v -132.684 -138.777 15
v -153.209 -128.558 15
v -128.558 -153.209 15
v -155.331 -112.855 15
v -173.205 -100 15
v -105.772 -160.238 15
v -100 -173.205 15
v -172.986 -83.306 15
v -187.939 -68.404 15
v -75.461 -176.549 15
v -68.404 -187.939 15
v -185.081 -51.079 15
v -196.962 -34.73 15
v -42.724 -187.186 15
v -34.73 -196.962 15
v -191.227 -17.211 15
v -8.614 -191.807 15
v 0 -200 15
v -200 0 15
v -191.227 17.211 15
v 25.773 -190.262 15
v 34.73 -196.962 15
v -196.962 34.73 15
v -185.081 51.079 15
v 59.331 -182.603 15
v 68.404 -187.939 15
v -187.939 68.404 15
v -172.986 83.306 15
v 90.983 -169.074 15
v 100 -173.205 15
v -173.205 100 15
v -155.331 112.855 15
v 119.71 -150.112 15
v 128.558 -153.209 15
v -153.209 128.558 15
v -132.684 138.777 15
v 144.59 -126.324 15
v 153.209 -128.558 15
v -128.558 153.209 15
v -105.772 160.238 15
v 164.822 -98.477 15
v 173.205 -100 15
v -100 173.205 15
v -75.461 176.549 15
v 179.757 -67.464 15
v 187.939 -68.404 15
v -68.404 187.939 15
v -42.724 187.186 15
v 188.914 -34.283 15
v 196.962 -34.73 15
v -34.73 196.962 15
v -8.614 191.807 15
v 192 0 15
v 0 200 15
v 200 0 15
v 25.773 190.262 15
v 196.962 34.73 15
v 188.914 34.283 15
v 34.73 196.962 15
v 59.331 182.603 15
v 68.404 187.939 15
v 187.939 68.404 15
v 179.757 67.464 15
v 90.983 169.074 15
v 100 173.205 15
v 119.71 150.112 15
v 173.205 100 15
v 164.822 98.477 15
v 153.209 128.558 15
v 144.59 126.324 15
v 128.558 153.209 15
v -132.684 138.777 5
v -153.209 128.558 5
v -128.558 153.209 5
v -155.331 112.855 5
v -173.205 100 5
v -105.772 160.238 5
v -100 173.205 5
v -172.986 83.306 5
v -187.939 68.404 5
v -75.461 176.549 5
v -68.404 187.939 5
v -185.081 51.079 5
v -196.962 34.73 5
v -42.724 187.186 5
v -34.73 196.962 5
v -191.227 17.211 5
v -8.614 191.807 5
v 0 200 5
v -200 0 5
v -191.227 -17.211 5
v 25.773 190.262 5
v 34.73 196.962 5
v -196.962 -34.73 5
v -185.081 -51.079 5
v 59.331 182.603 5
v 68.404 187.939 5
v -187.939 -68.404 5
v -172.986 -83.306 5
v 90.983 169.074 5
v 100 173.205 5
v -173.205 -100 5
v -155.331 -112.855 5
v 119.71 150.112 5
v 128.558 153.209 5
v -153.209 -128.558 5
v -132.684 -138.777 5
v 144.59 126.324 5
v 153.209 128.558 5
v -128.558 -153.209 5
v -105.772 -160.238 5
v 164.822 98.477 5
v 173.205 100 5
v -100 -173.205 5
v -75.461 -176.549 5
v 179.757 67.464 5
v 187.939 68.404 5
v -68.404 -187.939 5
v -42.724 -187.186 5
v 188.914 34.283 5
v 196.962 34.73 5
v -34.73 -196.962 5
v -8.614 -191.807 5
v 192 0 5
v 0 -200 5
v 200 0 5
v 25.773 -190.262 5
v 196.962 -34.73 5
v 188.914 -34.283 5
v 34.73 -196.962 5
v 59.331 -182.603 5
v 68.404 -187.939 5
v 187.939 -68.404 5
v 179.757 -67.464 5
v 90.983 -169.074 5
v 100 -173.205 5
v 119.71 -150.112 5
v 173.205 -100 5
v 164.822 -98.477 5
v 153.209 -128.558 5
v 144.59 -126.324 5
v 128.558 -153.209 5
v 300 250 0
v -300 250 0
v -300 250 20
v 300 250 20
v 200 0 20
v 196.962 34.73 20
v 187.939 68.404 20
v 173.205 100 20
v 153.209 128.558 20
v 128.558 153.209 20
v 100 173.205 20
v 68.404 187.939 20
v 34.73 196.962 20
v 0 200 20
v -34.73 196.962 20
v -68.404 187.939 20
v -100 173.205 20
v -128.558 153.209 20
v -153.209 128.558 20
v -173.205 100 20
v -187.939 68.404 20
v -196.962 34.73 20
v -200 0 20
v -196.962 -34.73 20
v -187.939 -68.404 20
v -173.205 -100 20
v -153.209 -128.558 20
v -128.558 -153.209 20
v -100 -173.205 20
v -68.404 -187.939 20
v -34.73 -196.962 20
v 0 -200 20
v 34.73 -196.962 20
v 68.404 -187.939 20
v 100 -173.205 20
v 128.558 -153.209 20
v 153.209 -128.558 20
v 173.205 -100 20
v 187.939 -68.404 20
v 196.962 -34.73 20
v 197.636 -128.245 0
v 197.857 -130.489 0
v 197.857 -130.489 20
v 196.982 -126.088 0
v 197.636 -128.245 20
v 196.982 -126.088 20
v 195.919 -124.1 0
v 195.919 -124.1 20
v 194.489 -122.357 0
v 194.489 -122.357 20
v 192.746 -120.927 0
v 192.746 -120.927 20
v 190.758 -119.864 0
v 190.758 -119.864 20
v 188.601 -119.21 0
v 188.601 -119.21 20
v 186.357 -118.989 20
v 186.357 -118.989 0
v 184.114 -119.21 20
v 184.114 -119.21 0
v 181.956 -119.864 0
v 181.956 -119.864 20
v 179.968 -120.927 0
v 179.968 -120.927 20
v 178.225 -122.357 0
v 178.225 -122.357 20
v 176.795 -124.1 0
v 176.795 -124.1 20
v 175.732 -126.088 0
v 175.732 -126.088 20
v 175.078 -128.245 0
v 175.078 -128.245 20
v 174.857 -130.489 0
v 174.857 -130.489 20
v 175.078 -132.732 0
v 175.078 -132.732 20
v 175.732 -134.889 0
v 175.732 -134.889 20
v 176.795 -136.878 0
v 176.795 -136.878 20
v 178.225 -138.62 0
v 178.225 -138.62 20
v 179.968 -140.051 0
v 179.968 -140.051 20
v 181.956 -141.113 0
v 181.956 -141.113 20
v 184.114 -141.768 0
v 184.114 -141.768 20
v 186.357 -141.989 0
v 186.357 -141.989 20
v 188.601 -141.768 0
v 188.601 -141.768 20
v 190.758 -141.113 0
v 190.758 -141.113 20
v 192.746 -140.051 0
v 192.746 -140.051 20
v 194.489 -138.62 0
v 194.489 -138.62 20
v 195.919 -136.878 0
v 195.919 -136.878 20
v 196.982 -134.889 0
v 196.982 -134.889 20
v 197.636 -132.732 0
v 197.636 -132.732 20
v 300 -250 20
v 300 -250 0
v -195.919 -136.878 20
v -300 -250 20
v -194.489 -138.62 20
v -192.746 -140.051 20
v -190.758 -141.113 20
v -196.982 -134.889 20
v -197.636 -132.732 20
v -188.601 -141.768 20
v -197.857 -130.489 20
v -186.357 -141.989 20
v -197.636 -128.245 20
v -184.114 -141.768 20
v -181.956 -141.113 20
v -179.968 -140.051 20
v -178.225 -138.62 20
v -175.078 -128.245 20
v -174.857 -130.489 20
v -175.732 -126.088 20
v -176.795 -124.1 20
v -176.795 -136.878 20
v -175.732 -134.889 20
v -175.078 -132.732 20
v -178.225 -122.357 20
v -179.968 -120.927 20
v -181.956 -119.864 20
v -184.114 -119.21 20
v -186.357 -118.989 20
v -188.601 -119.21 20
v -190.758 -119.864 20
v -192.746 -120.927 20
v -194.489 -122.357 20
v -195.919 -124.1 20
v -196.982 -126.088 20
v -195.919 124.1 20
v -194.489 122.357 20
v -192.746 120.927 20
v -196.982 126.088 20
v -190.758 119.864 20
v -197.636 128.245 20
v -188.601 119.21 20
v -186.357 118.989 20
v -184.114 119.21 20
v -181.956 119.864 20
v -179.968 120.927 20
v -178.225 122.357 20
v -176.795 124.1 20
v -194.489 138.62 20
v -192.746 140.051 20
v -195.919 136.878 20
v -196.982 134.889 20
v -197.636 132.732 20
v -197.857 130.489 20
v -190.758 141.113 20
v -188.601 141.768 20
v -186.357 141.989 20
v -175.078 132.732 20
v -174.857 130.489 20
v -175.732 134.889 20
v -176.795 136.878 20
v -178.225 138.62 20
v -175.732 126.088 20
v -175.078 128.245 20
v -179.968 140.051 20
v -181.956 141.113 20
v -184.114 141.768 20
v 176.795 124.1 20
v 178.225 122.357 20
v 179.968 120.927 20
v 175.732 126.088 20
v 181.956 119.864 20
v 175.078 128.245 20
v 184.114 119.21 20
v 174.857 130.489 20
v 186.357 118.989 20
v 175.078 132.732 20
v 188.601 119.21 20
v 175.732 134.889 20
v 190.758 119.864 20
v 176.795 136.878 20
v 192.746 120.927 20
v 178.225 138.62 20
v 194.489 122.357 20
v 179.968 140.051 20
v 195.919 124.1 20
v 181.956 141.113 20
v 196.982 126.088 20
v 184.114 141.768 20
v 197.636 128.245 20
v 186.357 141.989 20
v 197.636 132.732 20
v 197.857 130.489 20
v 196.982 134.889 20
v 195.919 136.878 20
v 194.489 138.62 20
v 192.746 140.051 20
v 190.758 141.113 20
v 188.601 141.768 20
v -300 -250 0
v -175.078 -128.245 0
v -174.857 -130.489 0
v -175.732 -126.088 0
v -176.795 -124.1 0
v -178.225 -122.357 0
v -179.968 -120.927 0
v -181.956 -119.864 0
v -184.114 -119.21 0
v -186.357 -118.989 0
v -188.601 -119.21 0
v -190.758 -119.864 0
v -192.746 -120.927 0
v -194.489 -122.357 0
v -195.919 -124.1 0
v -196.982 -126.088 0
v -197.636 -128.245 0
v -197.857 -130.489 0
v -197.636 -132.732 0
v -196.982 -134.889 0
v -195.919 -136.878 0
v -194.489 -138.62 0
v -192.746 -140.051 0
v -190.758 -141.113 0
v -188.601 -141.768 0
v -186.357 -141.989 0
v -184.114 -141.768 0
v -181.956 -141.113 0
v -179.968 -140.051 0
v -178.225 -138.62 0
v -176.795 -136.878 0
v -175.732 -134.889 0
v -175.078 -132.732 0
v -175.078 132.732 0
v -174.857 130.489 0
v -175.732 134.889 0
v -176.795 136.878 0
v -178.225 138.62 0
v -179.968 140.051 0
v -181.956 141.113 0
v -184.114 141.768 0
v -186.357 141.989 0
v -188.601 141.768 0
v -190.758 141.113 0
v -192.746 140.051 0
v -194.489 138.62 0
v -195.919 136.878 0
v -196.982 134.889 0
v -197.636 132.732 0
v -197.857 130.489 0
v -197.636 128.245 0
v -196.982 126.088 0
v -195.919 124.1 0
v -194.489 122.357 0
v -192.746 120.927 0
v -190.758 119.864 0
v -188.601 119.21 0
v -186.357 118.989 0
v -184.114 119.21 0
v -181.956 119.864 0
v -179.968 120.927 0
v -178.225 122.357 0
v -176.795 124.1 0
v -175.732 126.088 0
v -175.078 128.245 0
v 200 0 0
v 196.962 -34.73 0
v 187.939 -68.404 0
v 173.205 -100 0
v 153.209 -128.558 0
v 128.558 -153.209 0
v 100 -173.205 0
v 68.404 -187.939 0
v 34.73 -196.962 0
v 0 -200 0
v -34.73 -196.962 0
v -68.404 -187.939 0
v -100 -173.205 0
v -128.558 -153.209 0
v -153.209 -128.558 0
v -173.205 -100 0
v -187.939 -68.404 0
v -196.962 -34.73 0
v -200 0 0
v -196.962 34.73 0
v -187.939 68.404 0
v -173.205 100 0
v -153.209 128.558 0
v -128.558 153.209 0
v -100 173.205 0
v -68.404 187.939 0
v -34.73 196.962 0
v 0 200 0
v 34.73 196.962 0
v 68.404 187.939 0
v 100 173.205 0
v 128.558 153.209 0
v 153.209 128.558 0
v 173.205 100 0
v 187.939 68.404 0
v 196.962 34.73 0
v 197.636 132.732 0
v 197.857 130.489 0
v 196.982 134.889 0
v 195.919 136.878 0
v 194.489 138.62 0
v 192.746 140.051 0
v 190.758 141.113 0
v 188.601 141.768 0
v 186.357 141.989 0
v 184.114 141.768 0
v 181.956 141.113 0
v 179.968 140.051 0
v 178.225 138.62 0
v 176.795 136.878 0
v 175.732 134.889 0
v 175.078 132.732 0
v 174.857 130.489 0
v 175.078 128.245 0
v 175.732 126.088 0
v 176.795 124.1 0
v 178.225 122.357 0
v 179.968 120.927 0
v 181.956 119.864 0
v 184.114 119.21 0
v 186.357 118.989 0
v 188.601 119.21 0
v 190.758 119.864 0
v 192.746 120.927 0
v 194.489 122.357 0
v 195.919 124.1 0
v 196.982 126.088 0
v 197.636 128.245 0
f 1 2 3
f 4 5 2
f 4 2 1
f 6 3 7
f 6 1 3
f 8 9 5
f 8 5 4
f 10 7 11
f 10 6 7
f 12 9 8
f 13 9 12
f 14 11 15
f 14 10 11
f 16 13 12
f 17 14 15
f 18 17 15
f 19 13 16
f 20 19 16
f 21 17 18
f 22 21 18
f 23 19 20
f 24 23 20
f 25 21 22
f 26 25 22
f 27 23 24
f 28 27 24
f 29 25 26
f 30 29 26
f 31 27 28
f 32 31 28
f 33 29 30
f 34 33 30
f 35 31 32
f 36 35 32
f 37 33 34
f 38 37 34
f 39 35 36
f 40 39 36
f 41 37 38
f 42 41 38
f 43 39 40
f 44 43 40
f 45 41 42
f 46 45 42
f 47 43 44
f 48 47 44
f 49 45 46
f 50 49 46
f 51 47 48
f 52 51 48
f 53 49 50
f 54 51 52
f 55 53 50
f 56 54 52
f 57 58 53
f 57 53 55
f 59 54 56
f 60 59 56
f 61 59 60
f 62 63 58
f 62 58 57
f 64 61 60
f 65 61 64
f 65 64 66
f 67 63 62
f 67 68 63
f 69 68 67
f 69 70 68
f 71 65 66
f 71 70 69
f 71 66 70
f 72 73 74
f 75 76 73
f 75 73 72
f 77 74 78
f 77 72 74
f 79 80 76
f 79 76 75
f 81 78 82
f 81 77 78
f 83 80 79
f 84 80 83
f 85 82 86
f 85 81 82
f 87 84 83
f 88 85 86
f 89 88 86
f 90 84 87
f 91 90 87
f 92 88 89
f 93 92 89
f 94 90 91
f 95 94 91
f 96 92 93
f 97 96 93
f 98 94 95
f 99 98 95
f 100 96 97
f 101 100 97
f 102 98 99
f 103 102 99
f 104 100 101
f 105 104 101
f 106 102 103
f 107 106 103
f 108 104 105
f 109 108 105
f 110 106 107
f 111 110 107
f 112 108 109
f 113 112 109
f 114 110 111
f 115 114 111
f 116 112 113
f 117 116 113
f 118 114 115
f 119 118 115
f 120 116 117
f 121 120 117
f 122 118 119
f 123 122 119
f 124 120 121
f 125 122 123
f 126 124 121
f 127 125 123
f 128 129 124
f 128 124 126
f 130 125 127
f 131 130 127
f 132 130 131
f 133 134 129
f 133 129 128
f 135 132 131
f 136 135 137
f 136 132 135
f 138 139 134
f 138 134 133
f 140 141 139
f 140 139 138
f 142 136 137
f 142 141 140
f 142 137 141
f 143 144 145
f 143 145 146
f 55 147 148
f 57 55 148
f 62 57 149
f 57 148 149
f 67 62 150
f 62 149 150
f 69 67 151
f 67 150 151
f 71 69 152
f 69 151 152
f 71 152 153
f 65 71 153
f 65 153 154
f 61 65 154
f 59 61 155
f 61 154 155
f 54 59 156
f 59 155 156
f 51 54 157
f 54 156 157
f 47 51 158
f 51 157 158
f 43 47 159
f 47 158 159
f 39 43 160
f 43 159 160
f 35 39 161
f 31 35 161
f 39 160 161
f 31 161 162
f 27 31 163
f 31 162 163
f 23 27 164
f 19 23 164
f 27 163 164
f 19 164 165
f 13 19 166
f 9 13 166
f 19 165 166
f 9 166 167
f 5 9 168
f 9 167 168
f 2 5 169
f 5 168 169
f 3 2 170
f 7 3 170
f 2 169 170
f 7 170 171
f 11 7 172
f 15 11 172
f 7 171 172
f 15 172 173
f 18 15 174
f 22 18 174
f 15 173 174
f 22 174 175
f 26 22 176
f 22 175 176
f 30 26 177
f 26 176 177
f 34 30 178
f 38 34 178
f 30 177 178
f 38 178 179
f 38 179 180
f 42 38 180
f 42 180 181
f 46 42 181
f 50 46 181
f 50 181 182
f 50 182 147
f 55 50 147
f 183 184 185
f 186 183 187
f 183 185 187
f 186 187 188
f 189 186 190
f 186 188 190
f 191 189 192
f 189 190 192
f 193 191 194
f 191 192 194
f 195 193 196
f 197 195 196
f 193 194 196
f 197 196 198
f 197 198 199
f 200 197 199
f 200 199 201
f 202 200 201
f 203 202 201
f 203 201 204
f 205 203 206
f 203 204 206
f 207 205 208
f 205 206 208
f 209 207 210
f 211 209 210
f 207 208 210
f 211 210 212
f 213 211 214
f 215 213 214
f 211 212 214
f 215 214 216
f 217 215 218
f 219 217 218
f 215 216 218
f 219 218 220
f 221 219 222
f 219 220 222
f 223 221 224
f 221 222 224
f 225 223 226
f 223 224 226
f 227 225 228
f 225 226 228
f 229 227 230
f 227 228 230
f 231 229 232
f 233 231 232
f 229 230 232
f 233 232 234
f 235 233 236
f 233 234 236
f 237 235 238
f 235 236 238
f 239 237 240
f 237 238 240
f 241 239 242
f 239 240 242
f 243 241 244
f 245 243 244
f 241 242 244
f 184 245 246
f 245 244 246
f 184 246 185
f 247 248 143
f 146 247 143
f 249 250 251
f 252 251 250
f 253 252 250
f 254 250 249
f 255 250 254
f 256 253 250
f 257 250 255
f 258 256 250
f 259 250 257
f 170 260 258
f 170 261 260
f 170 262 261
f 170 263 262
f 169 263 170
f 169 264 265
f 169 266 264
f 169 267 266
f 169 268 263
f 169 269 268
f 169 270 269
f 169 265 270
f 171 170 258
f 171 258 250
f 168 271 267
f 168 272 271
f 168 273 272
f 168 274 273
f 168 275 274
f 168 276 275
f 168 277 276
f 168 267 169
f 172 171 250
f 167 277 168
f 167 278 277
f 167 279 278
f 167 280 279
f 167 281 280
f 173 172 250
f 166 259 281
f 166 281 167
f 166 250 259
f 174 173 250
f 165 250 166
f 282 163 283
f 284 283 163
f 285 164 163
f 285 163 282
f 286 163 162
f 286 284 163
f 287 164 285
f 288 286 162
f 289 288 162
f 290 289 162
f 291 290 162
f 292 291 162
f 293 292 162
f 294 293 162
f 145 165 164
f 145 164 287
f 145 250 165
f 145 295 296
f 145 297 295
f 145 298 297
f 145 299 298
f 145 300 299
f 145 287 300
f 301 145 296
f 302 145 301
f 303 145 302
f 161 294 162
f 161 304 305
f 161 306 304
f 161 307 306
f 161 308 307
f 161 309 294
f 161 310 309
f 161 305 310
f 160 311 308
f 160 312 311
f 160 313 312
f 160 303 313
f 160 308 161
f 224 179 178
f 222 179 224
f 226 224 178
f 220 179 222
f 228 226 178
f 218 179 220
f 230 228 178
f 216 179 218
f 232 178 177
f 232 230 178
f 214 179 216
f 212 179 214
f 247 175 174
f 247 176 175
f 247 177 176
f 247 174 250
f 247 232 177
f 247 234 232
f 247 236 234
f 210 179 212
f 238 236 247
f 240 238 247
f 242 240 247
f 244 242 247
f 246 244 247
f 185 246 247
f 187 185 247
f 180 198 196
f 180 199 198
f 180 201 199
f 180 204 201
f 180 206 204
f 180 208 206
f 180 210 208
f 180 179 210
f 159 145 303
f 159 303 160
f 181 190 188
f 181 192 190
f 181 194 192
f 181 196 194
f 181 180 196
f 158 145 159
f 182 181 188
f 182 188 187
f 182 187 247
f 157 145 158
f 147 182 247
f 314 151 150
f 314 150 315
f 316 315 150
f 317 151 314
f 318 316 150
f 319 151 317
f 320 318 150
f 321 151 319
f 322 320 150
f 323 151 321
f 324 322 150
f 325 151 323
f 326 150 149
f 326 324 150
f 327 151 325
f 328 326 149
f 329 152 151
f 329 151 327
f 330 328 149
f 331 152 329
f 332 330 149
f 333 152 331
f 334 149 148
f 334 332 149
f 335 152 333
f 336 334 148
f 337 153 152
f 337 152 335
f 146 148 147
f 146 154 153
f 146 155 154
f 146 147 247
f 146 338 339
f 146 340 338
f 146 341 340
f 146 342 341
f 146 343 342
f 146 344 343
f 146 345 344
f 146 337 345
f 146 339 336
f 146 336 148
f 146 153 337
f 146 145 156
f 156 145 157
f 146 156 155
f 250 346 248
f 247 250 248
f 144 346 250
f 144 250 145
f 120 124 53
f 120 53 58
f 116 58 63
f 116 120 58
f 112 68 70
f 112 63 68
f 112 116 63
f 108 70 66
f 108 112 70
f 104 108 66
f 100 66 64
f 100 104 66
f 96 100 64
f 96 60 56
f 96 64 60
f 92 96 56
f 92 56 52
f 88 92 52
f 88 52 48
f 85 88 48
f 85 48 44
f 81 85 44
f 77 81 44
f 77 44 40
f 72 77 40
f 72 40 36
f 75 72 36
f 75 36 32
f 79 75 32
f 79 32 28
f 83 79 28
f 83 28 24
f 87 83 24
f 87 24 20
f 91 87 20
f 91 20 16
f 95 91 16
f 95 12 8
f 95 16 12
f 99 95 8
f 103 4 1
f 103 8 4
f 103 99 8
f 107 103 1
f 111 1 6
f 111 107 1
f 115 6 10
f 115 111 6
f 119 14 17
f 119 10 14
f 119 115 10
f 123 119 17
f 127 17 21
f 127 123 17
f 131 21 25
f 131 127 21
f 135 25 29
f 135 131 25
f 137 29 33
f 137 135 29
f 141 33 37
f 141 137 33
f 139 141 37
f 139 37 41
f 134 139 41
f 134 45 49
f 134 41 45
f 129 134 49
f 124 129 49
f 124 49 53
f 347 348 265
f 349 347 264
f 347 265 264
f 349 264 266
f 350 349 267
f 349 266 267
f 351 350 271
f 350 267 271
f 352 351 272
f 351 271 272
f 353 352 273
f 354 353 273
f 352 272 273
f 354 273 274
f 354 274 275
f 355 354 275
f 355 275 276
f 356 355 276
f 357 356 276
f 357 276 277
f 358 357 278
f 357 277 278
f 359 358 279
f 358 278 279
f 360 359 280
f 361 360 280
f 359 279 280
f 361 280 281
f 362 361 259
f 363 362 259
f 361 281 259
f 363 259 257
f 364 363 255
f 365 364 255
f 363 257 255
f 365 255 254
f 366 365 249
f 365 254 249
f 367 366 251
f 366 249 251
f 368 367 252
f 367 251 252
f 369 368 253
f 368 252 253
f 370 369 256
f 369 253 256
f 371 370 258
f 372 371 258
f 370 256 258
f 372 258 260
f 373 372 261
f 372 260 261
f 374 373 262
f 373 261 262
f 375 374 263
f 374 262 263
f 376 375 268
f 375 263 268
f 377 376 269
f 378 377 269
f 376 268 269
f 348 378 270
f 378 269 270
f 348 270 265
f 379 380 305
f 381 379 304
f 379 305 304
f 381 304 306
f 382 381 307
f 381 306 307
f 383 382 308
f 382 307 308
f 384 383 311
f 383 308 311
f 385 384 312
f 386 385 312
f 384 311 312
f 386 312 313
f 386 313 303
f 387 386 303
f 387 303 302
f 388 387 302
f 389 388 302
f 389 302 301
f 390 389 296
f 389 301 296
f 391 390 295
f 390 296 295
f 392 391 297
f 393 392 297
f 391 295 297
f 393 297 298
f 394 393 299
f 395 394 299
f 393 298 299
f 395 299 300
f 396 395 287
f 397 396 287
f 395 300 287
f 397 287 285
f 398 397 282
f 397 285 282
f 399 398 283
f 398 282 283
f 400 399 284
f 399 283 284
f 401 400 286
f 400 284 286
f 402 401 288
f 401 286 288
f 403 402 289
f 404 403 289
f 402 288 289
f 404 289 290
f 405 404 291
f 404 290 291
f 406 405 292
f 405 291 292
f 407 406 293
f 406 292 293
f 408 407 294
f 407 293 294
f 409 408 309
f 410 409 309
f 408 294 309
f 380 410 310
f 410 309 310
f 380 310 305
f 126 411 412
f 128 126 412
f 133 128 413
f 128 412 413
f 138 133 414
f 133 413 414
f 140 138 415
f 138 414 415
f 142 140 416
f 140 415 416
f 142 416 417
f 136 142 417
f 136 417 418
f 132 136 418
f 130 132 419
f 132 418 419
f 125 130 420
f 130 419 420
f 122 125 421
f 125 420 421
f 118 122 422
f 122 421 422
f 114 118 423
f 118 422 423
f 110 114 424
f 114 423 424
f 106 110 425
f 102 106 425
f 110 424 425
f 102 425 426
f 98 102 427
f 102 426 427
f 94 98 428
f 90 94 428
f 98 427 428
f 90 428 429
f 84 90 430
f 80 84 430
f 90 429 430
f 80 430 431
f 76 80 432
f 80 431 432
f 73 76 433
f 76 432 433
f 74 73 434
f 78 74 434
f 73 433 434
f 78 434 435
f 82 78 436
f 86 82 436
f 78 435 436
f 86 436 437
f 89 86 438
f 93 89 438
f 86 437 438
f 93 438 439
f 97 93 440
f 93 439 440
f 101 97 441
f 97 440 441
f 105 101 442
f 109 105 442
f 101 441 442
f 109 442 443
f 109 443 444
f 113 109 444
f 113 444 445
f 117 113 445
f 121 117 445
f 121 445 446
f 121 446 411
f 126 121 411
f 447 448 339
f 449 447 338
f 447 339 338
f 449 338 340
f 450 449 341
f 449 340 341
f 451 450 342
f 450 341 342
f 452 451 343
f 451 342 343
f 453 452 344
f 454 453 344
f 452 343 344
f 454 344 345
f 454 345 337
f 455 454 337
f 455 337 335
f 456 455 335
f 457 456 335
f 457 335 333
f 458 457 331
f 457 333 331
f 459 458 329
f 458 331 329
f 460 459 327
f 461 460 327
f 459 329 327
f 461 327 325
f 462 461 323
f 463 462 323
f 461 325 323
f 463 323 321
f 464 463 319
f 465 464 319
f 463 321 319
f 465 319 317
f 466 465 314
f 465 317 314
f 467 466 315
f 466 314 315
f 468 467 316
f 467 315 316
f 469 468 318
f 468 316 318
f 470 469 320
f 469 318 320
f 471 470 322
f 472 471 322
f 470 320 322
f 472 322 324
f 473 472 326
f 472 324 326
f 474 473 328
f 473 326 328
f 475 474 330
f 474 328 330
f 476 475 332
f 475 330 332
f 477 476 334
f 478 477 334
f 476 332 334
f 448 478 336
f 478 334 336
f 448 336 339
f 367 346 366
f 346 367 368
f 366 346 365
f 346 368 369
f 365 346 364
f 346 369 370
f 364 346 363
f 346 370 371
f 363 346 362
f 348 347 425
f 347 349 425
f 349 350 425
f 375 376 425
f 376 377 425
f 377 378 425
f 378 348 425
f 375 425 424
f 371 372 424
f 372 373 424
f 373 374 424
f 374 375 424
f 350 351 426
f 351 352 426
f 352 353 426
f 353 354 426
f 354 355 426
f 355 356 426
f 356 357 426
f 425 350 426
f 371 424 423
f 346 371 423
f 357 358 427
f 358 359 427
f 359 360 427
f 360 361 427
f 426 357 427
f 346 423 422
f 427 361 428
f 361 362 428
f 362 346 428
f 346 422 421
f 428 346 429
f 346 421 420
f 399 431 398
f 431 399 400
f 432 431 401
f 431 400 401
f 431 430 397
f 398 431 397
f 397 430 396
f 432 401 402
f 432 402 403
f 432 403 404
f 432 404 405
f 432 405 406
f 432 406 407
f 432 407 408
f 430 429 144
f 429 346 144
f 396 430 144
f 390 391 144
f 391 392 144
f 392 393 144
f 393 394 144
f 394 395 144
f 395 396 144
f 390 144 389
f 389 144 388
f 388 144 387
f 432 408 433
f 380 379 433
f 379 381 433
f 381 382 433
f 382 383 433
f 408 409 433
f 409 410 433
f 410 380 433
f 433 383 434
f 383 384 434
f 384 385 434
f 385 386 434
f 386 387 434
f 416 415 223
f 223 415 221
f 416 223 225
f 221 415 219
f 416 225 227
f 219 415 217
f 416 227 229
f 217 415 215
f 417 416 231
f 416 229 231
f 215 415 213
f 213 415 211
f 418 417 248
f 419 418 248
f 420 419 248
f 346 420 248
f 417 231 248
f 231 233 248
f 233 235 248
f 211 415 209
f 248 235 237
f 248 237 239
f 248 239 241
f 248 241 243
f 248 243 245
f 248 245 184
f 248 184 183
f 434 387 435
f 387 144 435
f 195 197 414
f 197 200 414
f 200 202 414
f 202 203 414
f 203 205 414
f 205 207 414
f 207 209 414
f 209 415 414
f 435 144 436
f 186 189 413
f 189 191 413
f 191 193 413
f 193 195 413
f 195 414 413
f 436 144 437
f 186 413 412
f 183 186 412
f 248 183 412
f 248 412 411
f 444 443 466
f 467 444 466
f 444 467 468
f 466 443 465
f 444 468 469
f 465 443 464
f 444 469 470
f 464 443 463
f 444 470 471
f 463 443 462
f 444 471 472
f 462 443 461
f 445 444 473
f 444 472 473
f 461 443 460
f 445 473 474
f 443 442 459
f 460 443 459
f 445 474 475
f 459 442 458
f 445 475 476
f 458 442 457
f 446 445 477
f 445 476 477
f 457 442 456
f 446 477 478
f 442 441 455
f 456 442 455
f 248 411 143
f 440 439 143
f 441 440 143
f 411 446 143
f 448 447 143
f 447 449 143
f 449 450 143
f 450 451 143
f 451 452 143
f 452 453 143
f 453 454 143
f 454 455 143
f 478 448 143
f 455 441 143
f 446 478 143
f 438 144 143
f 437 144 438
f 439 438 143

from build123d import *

# Parameters (mm, degrees)
F0_W     = 600
F0_H     = 500
F0_R     = 192
F1_DEPTH = 20
F2_R     = 11.5
F3_DEPTH = 20
F4_R     = 200
F5_DEPTH = 5
F6_R     = 200
F7_DEPTH = 5


with BuildPart() as f1:
    # F0 (on Top) → F1 (new body)
    with BuildSketch(Plane.XY):
        Rectangle(F0_W, F0_H)
        Circle(F0_R, mode=Mode.SUBTRACT)
    extrude(amount=F1_DEPTH)

    # F2 (on face) → F3 (cut, through all)
    with BuildSketch(Plane.XY.offset(20)):
        with Locations((186.35709, 130.488639)):
            Circle(F2_R)
        with Locations((-186.35709, 130.488639)):
            Circle(F2_R)
        with Locations((-186.35709, -130.488639)):
            Circle(F2_R)
        with Locations((186.35709, -130.488639)):
            Circle(F2_R)
    extrude(amount=-F3_DEPTH, mode=Mode.SUBTRACT)

    # F4 (on face) → F5 (cut)
    with BuildSketch(Plane(origin=(0, 0, 0), x_dir=(1, 0, 0), z_dir=(0, 0, -1))):
        Circle(F4_R)
    extrude(amount=-F5_DEPTH, mode=Mode.SUBTRACT)

    # F6 (on face) → F7 (cut)
    with BuildSketch(Plane.XY.offset(20)):
        Circle(F6_R)
    extrude(amount=-F7_DEPTH, mode=Mode.SUBTRACT)


solid = f1.part
